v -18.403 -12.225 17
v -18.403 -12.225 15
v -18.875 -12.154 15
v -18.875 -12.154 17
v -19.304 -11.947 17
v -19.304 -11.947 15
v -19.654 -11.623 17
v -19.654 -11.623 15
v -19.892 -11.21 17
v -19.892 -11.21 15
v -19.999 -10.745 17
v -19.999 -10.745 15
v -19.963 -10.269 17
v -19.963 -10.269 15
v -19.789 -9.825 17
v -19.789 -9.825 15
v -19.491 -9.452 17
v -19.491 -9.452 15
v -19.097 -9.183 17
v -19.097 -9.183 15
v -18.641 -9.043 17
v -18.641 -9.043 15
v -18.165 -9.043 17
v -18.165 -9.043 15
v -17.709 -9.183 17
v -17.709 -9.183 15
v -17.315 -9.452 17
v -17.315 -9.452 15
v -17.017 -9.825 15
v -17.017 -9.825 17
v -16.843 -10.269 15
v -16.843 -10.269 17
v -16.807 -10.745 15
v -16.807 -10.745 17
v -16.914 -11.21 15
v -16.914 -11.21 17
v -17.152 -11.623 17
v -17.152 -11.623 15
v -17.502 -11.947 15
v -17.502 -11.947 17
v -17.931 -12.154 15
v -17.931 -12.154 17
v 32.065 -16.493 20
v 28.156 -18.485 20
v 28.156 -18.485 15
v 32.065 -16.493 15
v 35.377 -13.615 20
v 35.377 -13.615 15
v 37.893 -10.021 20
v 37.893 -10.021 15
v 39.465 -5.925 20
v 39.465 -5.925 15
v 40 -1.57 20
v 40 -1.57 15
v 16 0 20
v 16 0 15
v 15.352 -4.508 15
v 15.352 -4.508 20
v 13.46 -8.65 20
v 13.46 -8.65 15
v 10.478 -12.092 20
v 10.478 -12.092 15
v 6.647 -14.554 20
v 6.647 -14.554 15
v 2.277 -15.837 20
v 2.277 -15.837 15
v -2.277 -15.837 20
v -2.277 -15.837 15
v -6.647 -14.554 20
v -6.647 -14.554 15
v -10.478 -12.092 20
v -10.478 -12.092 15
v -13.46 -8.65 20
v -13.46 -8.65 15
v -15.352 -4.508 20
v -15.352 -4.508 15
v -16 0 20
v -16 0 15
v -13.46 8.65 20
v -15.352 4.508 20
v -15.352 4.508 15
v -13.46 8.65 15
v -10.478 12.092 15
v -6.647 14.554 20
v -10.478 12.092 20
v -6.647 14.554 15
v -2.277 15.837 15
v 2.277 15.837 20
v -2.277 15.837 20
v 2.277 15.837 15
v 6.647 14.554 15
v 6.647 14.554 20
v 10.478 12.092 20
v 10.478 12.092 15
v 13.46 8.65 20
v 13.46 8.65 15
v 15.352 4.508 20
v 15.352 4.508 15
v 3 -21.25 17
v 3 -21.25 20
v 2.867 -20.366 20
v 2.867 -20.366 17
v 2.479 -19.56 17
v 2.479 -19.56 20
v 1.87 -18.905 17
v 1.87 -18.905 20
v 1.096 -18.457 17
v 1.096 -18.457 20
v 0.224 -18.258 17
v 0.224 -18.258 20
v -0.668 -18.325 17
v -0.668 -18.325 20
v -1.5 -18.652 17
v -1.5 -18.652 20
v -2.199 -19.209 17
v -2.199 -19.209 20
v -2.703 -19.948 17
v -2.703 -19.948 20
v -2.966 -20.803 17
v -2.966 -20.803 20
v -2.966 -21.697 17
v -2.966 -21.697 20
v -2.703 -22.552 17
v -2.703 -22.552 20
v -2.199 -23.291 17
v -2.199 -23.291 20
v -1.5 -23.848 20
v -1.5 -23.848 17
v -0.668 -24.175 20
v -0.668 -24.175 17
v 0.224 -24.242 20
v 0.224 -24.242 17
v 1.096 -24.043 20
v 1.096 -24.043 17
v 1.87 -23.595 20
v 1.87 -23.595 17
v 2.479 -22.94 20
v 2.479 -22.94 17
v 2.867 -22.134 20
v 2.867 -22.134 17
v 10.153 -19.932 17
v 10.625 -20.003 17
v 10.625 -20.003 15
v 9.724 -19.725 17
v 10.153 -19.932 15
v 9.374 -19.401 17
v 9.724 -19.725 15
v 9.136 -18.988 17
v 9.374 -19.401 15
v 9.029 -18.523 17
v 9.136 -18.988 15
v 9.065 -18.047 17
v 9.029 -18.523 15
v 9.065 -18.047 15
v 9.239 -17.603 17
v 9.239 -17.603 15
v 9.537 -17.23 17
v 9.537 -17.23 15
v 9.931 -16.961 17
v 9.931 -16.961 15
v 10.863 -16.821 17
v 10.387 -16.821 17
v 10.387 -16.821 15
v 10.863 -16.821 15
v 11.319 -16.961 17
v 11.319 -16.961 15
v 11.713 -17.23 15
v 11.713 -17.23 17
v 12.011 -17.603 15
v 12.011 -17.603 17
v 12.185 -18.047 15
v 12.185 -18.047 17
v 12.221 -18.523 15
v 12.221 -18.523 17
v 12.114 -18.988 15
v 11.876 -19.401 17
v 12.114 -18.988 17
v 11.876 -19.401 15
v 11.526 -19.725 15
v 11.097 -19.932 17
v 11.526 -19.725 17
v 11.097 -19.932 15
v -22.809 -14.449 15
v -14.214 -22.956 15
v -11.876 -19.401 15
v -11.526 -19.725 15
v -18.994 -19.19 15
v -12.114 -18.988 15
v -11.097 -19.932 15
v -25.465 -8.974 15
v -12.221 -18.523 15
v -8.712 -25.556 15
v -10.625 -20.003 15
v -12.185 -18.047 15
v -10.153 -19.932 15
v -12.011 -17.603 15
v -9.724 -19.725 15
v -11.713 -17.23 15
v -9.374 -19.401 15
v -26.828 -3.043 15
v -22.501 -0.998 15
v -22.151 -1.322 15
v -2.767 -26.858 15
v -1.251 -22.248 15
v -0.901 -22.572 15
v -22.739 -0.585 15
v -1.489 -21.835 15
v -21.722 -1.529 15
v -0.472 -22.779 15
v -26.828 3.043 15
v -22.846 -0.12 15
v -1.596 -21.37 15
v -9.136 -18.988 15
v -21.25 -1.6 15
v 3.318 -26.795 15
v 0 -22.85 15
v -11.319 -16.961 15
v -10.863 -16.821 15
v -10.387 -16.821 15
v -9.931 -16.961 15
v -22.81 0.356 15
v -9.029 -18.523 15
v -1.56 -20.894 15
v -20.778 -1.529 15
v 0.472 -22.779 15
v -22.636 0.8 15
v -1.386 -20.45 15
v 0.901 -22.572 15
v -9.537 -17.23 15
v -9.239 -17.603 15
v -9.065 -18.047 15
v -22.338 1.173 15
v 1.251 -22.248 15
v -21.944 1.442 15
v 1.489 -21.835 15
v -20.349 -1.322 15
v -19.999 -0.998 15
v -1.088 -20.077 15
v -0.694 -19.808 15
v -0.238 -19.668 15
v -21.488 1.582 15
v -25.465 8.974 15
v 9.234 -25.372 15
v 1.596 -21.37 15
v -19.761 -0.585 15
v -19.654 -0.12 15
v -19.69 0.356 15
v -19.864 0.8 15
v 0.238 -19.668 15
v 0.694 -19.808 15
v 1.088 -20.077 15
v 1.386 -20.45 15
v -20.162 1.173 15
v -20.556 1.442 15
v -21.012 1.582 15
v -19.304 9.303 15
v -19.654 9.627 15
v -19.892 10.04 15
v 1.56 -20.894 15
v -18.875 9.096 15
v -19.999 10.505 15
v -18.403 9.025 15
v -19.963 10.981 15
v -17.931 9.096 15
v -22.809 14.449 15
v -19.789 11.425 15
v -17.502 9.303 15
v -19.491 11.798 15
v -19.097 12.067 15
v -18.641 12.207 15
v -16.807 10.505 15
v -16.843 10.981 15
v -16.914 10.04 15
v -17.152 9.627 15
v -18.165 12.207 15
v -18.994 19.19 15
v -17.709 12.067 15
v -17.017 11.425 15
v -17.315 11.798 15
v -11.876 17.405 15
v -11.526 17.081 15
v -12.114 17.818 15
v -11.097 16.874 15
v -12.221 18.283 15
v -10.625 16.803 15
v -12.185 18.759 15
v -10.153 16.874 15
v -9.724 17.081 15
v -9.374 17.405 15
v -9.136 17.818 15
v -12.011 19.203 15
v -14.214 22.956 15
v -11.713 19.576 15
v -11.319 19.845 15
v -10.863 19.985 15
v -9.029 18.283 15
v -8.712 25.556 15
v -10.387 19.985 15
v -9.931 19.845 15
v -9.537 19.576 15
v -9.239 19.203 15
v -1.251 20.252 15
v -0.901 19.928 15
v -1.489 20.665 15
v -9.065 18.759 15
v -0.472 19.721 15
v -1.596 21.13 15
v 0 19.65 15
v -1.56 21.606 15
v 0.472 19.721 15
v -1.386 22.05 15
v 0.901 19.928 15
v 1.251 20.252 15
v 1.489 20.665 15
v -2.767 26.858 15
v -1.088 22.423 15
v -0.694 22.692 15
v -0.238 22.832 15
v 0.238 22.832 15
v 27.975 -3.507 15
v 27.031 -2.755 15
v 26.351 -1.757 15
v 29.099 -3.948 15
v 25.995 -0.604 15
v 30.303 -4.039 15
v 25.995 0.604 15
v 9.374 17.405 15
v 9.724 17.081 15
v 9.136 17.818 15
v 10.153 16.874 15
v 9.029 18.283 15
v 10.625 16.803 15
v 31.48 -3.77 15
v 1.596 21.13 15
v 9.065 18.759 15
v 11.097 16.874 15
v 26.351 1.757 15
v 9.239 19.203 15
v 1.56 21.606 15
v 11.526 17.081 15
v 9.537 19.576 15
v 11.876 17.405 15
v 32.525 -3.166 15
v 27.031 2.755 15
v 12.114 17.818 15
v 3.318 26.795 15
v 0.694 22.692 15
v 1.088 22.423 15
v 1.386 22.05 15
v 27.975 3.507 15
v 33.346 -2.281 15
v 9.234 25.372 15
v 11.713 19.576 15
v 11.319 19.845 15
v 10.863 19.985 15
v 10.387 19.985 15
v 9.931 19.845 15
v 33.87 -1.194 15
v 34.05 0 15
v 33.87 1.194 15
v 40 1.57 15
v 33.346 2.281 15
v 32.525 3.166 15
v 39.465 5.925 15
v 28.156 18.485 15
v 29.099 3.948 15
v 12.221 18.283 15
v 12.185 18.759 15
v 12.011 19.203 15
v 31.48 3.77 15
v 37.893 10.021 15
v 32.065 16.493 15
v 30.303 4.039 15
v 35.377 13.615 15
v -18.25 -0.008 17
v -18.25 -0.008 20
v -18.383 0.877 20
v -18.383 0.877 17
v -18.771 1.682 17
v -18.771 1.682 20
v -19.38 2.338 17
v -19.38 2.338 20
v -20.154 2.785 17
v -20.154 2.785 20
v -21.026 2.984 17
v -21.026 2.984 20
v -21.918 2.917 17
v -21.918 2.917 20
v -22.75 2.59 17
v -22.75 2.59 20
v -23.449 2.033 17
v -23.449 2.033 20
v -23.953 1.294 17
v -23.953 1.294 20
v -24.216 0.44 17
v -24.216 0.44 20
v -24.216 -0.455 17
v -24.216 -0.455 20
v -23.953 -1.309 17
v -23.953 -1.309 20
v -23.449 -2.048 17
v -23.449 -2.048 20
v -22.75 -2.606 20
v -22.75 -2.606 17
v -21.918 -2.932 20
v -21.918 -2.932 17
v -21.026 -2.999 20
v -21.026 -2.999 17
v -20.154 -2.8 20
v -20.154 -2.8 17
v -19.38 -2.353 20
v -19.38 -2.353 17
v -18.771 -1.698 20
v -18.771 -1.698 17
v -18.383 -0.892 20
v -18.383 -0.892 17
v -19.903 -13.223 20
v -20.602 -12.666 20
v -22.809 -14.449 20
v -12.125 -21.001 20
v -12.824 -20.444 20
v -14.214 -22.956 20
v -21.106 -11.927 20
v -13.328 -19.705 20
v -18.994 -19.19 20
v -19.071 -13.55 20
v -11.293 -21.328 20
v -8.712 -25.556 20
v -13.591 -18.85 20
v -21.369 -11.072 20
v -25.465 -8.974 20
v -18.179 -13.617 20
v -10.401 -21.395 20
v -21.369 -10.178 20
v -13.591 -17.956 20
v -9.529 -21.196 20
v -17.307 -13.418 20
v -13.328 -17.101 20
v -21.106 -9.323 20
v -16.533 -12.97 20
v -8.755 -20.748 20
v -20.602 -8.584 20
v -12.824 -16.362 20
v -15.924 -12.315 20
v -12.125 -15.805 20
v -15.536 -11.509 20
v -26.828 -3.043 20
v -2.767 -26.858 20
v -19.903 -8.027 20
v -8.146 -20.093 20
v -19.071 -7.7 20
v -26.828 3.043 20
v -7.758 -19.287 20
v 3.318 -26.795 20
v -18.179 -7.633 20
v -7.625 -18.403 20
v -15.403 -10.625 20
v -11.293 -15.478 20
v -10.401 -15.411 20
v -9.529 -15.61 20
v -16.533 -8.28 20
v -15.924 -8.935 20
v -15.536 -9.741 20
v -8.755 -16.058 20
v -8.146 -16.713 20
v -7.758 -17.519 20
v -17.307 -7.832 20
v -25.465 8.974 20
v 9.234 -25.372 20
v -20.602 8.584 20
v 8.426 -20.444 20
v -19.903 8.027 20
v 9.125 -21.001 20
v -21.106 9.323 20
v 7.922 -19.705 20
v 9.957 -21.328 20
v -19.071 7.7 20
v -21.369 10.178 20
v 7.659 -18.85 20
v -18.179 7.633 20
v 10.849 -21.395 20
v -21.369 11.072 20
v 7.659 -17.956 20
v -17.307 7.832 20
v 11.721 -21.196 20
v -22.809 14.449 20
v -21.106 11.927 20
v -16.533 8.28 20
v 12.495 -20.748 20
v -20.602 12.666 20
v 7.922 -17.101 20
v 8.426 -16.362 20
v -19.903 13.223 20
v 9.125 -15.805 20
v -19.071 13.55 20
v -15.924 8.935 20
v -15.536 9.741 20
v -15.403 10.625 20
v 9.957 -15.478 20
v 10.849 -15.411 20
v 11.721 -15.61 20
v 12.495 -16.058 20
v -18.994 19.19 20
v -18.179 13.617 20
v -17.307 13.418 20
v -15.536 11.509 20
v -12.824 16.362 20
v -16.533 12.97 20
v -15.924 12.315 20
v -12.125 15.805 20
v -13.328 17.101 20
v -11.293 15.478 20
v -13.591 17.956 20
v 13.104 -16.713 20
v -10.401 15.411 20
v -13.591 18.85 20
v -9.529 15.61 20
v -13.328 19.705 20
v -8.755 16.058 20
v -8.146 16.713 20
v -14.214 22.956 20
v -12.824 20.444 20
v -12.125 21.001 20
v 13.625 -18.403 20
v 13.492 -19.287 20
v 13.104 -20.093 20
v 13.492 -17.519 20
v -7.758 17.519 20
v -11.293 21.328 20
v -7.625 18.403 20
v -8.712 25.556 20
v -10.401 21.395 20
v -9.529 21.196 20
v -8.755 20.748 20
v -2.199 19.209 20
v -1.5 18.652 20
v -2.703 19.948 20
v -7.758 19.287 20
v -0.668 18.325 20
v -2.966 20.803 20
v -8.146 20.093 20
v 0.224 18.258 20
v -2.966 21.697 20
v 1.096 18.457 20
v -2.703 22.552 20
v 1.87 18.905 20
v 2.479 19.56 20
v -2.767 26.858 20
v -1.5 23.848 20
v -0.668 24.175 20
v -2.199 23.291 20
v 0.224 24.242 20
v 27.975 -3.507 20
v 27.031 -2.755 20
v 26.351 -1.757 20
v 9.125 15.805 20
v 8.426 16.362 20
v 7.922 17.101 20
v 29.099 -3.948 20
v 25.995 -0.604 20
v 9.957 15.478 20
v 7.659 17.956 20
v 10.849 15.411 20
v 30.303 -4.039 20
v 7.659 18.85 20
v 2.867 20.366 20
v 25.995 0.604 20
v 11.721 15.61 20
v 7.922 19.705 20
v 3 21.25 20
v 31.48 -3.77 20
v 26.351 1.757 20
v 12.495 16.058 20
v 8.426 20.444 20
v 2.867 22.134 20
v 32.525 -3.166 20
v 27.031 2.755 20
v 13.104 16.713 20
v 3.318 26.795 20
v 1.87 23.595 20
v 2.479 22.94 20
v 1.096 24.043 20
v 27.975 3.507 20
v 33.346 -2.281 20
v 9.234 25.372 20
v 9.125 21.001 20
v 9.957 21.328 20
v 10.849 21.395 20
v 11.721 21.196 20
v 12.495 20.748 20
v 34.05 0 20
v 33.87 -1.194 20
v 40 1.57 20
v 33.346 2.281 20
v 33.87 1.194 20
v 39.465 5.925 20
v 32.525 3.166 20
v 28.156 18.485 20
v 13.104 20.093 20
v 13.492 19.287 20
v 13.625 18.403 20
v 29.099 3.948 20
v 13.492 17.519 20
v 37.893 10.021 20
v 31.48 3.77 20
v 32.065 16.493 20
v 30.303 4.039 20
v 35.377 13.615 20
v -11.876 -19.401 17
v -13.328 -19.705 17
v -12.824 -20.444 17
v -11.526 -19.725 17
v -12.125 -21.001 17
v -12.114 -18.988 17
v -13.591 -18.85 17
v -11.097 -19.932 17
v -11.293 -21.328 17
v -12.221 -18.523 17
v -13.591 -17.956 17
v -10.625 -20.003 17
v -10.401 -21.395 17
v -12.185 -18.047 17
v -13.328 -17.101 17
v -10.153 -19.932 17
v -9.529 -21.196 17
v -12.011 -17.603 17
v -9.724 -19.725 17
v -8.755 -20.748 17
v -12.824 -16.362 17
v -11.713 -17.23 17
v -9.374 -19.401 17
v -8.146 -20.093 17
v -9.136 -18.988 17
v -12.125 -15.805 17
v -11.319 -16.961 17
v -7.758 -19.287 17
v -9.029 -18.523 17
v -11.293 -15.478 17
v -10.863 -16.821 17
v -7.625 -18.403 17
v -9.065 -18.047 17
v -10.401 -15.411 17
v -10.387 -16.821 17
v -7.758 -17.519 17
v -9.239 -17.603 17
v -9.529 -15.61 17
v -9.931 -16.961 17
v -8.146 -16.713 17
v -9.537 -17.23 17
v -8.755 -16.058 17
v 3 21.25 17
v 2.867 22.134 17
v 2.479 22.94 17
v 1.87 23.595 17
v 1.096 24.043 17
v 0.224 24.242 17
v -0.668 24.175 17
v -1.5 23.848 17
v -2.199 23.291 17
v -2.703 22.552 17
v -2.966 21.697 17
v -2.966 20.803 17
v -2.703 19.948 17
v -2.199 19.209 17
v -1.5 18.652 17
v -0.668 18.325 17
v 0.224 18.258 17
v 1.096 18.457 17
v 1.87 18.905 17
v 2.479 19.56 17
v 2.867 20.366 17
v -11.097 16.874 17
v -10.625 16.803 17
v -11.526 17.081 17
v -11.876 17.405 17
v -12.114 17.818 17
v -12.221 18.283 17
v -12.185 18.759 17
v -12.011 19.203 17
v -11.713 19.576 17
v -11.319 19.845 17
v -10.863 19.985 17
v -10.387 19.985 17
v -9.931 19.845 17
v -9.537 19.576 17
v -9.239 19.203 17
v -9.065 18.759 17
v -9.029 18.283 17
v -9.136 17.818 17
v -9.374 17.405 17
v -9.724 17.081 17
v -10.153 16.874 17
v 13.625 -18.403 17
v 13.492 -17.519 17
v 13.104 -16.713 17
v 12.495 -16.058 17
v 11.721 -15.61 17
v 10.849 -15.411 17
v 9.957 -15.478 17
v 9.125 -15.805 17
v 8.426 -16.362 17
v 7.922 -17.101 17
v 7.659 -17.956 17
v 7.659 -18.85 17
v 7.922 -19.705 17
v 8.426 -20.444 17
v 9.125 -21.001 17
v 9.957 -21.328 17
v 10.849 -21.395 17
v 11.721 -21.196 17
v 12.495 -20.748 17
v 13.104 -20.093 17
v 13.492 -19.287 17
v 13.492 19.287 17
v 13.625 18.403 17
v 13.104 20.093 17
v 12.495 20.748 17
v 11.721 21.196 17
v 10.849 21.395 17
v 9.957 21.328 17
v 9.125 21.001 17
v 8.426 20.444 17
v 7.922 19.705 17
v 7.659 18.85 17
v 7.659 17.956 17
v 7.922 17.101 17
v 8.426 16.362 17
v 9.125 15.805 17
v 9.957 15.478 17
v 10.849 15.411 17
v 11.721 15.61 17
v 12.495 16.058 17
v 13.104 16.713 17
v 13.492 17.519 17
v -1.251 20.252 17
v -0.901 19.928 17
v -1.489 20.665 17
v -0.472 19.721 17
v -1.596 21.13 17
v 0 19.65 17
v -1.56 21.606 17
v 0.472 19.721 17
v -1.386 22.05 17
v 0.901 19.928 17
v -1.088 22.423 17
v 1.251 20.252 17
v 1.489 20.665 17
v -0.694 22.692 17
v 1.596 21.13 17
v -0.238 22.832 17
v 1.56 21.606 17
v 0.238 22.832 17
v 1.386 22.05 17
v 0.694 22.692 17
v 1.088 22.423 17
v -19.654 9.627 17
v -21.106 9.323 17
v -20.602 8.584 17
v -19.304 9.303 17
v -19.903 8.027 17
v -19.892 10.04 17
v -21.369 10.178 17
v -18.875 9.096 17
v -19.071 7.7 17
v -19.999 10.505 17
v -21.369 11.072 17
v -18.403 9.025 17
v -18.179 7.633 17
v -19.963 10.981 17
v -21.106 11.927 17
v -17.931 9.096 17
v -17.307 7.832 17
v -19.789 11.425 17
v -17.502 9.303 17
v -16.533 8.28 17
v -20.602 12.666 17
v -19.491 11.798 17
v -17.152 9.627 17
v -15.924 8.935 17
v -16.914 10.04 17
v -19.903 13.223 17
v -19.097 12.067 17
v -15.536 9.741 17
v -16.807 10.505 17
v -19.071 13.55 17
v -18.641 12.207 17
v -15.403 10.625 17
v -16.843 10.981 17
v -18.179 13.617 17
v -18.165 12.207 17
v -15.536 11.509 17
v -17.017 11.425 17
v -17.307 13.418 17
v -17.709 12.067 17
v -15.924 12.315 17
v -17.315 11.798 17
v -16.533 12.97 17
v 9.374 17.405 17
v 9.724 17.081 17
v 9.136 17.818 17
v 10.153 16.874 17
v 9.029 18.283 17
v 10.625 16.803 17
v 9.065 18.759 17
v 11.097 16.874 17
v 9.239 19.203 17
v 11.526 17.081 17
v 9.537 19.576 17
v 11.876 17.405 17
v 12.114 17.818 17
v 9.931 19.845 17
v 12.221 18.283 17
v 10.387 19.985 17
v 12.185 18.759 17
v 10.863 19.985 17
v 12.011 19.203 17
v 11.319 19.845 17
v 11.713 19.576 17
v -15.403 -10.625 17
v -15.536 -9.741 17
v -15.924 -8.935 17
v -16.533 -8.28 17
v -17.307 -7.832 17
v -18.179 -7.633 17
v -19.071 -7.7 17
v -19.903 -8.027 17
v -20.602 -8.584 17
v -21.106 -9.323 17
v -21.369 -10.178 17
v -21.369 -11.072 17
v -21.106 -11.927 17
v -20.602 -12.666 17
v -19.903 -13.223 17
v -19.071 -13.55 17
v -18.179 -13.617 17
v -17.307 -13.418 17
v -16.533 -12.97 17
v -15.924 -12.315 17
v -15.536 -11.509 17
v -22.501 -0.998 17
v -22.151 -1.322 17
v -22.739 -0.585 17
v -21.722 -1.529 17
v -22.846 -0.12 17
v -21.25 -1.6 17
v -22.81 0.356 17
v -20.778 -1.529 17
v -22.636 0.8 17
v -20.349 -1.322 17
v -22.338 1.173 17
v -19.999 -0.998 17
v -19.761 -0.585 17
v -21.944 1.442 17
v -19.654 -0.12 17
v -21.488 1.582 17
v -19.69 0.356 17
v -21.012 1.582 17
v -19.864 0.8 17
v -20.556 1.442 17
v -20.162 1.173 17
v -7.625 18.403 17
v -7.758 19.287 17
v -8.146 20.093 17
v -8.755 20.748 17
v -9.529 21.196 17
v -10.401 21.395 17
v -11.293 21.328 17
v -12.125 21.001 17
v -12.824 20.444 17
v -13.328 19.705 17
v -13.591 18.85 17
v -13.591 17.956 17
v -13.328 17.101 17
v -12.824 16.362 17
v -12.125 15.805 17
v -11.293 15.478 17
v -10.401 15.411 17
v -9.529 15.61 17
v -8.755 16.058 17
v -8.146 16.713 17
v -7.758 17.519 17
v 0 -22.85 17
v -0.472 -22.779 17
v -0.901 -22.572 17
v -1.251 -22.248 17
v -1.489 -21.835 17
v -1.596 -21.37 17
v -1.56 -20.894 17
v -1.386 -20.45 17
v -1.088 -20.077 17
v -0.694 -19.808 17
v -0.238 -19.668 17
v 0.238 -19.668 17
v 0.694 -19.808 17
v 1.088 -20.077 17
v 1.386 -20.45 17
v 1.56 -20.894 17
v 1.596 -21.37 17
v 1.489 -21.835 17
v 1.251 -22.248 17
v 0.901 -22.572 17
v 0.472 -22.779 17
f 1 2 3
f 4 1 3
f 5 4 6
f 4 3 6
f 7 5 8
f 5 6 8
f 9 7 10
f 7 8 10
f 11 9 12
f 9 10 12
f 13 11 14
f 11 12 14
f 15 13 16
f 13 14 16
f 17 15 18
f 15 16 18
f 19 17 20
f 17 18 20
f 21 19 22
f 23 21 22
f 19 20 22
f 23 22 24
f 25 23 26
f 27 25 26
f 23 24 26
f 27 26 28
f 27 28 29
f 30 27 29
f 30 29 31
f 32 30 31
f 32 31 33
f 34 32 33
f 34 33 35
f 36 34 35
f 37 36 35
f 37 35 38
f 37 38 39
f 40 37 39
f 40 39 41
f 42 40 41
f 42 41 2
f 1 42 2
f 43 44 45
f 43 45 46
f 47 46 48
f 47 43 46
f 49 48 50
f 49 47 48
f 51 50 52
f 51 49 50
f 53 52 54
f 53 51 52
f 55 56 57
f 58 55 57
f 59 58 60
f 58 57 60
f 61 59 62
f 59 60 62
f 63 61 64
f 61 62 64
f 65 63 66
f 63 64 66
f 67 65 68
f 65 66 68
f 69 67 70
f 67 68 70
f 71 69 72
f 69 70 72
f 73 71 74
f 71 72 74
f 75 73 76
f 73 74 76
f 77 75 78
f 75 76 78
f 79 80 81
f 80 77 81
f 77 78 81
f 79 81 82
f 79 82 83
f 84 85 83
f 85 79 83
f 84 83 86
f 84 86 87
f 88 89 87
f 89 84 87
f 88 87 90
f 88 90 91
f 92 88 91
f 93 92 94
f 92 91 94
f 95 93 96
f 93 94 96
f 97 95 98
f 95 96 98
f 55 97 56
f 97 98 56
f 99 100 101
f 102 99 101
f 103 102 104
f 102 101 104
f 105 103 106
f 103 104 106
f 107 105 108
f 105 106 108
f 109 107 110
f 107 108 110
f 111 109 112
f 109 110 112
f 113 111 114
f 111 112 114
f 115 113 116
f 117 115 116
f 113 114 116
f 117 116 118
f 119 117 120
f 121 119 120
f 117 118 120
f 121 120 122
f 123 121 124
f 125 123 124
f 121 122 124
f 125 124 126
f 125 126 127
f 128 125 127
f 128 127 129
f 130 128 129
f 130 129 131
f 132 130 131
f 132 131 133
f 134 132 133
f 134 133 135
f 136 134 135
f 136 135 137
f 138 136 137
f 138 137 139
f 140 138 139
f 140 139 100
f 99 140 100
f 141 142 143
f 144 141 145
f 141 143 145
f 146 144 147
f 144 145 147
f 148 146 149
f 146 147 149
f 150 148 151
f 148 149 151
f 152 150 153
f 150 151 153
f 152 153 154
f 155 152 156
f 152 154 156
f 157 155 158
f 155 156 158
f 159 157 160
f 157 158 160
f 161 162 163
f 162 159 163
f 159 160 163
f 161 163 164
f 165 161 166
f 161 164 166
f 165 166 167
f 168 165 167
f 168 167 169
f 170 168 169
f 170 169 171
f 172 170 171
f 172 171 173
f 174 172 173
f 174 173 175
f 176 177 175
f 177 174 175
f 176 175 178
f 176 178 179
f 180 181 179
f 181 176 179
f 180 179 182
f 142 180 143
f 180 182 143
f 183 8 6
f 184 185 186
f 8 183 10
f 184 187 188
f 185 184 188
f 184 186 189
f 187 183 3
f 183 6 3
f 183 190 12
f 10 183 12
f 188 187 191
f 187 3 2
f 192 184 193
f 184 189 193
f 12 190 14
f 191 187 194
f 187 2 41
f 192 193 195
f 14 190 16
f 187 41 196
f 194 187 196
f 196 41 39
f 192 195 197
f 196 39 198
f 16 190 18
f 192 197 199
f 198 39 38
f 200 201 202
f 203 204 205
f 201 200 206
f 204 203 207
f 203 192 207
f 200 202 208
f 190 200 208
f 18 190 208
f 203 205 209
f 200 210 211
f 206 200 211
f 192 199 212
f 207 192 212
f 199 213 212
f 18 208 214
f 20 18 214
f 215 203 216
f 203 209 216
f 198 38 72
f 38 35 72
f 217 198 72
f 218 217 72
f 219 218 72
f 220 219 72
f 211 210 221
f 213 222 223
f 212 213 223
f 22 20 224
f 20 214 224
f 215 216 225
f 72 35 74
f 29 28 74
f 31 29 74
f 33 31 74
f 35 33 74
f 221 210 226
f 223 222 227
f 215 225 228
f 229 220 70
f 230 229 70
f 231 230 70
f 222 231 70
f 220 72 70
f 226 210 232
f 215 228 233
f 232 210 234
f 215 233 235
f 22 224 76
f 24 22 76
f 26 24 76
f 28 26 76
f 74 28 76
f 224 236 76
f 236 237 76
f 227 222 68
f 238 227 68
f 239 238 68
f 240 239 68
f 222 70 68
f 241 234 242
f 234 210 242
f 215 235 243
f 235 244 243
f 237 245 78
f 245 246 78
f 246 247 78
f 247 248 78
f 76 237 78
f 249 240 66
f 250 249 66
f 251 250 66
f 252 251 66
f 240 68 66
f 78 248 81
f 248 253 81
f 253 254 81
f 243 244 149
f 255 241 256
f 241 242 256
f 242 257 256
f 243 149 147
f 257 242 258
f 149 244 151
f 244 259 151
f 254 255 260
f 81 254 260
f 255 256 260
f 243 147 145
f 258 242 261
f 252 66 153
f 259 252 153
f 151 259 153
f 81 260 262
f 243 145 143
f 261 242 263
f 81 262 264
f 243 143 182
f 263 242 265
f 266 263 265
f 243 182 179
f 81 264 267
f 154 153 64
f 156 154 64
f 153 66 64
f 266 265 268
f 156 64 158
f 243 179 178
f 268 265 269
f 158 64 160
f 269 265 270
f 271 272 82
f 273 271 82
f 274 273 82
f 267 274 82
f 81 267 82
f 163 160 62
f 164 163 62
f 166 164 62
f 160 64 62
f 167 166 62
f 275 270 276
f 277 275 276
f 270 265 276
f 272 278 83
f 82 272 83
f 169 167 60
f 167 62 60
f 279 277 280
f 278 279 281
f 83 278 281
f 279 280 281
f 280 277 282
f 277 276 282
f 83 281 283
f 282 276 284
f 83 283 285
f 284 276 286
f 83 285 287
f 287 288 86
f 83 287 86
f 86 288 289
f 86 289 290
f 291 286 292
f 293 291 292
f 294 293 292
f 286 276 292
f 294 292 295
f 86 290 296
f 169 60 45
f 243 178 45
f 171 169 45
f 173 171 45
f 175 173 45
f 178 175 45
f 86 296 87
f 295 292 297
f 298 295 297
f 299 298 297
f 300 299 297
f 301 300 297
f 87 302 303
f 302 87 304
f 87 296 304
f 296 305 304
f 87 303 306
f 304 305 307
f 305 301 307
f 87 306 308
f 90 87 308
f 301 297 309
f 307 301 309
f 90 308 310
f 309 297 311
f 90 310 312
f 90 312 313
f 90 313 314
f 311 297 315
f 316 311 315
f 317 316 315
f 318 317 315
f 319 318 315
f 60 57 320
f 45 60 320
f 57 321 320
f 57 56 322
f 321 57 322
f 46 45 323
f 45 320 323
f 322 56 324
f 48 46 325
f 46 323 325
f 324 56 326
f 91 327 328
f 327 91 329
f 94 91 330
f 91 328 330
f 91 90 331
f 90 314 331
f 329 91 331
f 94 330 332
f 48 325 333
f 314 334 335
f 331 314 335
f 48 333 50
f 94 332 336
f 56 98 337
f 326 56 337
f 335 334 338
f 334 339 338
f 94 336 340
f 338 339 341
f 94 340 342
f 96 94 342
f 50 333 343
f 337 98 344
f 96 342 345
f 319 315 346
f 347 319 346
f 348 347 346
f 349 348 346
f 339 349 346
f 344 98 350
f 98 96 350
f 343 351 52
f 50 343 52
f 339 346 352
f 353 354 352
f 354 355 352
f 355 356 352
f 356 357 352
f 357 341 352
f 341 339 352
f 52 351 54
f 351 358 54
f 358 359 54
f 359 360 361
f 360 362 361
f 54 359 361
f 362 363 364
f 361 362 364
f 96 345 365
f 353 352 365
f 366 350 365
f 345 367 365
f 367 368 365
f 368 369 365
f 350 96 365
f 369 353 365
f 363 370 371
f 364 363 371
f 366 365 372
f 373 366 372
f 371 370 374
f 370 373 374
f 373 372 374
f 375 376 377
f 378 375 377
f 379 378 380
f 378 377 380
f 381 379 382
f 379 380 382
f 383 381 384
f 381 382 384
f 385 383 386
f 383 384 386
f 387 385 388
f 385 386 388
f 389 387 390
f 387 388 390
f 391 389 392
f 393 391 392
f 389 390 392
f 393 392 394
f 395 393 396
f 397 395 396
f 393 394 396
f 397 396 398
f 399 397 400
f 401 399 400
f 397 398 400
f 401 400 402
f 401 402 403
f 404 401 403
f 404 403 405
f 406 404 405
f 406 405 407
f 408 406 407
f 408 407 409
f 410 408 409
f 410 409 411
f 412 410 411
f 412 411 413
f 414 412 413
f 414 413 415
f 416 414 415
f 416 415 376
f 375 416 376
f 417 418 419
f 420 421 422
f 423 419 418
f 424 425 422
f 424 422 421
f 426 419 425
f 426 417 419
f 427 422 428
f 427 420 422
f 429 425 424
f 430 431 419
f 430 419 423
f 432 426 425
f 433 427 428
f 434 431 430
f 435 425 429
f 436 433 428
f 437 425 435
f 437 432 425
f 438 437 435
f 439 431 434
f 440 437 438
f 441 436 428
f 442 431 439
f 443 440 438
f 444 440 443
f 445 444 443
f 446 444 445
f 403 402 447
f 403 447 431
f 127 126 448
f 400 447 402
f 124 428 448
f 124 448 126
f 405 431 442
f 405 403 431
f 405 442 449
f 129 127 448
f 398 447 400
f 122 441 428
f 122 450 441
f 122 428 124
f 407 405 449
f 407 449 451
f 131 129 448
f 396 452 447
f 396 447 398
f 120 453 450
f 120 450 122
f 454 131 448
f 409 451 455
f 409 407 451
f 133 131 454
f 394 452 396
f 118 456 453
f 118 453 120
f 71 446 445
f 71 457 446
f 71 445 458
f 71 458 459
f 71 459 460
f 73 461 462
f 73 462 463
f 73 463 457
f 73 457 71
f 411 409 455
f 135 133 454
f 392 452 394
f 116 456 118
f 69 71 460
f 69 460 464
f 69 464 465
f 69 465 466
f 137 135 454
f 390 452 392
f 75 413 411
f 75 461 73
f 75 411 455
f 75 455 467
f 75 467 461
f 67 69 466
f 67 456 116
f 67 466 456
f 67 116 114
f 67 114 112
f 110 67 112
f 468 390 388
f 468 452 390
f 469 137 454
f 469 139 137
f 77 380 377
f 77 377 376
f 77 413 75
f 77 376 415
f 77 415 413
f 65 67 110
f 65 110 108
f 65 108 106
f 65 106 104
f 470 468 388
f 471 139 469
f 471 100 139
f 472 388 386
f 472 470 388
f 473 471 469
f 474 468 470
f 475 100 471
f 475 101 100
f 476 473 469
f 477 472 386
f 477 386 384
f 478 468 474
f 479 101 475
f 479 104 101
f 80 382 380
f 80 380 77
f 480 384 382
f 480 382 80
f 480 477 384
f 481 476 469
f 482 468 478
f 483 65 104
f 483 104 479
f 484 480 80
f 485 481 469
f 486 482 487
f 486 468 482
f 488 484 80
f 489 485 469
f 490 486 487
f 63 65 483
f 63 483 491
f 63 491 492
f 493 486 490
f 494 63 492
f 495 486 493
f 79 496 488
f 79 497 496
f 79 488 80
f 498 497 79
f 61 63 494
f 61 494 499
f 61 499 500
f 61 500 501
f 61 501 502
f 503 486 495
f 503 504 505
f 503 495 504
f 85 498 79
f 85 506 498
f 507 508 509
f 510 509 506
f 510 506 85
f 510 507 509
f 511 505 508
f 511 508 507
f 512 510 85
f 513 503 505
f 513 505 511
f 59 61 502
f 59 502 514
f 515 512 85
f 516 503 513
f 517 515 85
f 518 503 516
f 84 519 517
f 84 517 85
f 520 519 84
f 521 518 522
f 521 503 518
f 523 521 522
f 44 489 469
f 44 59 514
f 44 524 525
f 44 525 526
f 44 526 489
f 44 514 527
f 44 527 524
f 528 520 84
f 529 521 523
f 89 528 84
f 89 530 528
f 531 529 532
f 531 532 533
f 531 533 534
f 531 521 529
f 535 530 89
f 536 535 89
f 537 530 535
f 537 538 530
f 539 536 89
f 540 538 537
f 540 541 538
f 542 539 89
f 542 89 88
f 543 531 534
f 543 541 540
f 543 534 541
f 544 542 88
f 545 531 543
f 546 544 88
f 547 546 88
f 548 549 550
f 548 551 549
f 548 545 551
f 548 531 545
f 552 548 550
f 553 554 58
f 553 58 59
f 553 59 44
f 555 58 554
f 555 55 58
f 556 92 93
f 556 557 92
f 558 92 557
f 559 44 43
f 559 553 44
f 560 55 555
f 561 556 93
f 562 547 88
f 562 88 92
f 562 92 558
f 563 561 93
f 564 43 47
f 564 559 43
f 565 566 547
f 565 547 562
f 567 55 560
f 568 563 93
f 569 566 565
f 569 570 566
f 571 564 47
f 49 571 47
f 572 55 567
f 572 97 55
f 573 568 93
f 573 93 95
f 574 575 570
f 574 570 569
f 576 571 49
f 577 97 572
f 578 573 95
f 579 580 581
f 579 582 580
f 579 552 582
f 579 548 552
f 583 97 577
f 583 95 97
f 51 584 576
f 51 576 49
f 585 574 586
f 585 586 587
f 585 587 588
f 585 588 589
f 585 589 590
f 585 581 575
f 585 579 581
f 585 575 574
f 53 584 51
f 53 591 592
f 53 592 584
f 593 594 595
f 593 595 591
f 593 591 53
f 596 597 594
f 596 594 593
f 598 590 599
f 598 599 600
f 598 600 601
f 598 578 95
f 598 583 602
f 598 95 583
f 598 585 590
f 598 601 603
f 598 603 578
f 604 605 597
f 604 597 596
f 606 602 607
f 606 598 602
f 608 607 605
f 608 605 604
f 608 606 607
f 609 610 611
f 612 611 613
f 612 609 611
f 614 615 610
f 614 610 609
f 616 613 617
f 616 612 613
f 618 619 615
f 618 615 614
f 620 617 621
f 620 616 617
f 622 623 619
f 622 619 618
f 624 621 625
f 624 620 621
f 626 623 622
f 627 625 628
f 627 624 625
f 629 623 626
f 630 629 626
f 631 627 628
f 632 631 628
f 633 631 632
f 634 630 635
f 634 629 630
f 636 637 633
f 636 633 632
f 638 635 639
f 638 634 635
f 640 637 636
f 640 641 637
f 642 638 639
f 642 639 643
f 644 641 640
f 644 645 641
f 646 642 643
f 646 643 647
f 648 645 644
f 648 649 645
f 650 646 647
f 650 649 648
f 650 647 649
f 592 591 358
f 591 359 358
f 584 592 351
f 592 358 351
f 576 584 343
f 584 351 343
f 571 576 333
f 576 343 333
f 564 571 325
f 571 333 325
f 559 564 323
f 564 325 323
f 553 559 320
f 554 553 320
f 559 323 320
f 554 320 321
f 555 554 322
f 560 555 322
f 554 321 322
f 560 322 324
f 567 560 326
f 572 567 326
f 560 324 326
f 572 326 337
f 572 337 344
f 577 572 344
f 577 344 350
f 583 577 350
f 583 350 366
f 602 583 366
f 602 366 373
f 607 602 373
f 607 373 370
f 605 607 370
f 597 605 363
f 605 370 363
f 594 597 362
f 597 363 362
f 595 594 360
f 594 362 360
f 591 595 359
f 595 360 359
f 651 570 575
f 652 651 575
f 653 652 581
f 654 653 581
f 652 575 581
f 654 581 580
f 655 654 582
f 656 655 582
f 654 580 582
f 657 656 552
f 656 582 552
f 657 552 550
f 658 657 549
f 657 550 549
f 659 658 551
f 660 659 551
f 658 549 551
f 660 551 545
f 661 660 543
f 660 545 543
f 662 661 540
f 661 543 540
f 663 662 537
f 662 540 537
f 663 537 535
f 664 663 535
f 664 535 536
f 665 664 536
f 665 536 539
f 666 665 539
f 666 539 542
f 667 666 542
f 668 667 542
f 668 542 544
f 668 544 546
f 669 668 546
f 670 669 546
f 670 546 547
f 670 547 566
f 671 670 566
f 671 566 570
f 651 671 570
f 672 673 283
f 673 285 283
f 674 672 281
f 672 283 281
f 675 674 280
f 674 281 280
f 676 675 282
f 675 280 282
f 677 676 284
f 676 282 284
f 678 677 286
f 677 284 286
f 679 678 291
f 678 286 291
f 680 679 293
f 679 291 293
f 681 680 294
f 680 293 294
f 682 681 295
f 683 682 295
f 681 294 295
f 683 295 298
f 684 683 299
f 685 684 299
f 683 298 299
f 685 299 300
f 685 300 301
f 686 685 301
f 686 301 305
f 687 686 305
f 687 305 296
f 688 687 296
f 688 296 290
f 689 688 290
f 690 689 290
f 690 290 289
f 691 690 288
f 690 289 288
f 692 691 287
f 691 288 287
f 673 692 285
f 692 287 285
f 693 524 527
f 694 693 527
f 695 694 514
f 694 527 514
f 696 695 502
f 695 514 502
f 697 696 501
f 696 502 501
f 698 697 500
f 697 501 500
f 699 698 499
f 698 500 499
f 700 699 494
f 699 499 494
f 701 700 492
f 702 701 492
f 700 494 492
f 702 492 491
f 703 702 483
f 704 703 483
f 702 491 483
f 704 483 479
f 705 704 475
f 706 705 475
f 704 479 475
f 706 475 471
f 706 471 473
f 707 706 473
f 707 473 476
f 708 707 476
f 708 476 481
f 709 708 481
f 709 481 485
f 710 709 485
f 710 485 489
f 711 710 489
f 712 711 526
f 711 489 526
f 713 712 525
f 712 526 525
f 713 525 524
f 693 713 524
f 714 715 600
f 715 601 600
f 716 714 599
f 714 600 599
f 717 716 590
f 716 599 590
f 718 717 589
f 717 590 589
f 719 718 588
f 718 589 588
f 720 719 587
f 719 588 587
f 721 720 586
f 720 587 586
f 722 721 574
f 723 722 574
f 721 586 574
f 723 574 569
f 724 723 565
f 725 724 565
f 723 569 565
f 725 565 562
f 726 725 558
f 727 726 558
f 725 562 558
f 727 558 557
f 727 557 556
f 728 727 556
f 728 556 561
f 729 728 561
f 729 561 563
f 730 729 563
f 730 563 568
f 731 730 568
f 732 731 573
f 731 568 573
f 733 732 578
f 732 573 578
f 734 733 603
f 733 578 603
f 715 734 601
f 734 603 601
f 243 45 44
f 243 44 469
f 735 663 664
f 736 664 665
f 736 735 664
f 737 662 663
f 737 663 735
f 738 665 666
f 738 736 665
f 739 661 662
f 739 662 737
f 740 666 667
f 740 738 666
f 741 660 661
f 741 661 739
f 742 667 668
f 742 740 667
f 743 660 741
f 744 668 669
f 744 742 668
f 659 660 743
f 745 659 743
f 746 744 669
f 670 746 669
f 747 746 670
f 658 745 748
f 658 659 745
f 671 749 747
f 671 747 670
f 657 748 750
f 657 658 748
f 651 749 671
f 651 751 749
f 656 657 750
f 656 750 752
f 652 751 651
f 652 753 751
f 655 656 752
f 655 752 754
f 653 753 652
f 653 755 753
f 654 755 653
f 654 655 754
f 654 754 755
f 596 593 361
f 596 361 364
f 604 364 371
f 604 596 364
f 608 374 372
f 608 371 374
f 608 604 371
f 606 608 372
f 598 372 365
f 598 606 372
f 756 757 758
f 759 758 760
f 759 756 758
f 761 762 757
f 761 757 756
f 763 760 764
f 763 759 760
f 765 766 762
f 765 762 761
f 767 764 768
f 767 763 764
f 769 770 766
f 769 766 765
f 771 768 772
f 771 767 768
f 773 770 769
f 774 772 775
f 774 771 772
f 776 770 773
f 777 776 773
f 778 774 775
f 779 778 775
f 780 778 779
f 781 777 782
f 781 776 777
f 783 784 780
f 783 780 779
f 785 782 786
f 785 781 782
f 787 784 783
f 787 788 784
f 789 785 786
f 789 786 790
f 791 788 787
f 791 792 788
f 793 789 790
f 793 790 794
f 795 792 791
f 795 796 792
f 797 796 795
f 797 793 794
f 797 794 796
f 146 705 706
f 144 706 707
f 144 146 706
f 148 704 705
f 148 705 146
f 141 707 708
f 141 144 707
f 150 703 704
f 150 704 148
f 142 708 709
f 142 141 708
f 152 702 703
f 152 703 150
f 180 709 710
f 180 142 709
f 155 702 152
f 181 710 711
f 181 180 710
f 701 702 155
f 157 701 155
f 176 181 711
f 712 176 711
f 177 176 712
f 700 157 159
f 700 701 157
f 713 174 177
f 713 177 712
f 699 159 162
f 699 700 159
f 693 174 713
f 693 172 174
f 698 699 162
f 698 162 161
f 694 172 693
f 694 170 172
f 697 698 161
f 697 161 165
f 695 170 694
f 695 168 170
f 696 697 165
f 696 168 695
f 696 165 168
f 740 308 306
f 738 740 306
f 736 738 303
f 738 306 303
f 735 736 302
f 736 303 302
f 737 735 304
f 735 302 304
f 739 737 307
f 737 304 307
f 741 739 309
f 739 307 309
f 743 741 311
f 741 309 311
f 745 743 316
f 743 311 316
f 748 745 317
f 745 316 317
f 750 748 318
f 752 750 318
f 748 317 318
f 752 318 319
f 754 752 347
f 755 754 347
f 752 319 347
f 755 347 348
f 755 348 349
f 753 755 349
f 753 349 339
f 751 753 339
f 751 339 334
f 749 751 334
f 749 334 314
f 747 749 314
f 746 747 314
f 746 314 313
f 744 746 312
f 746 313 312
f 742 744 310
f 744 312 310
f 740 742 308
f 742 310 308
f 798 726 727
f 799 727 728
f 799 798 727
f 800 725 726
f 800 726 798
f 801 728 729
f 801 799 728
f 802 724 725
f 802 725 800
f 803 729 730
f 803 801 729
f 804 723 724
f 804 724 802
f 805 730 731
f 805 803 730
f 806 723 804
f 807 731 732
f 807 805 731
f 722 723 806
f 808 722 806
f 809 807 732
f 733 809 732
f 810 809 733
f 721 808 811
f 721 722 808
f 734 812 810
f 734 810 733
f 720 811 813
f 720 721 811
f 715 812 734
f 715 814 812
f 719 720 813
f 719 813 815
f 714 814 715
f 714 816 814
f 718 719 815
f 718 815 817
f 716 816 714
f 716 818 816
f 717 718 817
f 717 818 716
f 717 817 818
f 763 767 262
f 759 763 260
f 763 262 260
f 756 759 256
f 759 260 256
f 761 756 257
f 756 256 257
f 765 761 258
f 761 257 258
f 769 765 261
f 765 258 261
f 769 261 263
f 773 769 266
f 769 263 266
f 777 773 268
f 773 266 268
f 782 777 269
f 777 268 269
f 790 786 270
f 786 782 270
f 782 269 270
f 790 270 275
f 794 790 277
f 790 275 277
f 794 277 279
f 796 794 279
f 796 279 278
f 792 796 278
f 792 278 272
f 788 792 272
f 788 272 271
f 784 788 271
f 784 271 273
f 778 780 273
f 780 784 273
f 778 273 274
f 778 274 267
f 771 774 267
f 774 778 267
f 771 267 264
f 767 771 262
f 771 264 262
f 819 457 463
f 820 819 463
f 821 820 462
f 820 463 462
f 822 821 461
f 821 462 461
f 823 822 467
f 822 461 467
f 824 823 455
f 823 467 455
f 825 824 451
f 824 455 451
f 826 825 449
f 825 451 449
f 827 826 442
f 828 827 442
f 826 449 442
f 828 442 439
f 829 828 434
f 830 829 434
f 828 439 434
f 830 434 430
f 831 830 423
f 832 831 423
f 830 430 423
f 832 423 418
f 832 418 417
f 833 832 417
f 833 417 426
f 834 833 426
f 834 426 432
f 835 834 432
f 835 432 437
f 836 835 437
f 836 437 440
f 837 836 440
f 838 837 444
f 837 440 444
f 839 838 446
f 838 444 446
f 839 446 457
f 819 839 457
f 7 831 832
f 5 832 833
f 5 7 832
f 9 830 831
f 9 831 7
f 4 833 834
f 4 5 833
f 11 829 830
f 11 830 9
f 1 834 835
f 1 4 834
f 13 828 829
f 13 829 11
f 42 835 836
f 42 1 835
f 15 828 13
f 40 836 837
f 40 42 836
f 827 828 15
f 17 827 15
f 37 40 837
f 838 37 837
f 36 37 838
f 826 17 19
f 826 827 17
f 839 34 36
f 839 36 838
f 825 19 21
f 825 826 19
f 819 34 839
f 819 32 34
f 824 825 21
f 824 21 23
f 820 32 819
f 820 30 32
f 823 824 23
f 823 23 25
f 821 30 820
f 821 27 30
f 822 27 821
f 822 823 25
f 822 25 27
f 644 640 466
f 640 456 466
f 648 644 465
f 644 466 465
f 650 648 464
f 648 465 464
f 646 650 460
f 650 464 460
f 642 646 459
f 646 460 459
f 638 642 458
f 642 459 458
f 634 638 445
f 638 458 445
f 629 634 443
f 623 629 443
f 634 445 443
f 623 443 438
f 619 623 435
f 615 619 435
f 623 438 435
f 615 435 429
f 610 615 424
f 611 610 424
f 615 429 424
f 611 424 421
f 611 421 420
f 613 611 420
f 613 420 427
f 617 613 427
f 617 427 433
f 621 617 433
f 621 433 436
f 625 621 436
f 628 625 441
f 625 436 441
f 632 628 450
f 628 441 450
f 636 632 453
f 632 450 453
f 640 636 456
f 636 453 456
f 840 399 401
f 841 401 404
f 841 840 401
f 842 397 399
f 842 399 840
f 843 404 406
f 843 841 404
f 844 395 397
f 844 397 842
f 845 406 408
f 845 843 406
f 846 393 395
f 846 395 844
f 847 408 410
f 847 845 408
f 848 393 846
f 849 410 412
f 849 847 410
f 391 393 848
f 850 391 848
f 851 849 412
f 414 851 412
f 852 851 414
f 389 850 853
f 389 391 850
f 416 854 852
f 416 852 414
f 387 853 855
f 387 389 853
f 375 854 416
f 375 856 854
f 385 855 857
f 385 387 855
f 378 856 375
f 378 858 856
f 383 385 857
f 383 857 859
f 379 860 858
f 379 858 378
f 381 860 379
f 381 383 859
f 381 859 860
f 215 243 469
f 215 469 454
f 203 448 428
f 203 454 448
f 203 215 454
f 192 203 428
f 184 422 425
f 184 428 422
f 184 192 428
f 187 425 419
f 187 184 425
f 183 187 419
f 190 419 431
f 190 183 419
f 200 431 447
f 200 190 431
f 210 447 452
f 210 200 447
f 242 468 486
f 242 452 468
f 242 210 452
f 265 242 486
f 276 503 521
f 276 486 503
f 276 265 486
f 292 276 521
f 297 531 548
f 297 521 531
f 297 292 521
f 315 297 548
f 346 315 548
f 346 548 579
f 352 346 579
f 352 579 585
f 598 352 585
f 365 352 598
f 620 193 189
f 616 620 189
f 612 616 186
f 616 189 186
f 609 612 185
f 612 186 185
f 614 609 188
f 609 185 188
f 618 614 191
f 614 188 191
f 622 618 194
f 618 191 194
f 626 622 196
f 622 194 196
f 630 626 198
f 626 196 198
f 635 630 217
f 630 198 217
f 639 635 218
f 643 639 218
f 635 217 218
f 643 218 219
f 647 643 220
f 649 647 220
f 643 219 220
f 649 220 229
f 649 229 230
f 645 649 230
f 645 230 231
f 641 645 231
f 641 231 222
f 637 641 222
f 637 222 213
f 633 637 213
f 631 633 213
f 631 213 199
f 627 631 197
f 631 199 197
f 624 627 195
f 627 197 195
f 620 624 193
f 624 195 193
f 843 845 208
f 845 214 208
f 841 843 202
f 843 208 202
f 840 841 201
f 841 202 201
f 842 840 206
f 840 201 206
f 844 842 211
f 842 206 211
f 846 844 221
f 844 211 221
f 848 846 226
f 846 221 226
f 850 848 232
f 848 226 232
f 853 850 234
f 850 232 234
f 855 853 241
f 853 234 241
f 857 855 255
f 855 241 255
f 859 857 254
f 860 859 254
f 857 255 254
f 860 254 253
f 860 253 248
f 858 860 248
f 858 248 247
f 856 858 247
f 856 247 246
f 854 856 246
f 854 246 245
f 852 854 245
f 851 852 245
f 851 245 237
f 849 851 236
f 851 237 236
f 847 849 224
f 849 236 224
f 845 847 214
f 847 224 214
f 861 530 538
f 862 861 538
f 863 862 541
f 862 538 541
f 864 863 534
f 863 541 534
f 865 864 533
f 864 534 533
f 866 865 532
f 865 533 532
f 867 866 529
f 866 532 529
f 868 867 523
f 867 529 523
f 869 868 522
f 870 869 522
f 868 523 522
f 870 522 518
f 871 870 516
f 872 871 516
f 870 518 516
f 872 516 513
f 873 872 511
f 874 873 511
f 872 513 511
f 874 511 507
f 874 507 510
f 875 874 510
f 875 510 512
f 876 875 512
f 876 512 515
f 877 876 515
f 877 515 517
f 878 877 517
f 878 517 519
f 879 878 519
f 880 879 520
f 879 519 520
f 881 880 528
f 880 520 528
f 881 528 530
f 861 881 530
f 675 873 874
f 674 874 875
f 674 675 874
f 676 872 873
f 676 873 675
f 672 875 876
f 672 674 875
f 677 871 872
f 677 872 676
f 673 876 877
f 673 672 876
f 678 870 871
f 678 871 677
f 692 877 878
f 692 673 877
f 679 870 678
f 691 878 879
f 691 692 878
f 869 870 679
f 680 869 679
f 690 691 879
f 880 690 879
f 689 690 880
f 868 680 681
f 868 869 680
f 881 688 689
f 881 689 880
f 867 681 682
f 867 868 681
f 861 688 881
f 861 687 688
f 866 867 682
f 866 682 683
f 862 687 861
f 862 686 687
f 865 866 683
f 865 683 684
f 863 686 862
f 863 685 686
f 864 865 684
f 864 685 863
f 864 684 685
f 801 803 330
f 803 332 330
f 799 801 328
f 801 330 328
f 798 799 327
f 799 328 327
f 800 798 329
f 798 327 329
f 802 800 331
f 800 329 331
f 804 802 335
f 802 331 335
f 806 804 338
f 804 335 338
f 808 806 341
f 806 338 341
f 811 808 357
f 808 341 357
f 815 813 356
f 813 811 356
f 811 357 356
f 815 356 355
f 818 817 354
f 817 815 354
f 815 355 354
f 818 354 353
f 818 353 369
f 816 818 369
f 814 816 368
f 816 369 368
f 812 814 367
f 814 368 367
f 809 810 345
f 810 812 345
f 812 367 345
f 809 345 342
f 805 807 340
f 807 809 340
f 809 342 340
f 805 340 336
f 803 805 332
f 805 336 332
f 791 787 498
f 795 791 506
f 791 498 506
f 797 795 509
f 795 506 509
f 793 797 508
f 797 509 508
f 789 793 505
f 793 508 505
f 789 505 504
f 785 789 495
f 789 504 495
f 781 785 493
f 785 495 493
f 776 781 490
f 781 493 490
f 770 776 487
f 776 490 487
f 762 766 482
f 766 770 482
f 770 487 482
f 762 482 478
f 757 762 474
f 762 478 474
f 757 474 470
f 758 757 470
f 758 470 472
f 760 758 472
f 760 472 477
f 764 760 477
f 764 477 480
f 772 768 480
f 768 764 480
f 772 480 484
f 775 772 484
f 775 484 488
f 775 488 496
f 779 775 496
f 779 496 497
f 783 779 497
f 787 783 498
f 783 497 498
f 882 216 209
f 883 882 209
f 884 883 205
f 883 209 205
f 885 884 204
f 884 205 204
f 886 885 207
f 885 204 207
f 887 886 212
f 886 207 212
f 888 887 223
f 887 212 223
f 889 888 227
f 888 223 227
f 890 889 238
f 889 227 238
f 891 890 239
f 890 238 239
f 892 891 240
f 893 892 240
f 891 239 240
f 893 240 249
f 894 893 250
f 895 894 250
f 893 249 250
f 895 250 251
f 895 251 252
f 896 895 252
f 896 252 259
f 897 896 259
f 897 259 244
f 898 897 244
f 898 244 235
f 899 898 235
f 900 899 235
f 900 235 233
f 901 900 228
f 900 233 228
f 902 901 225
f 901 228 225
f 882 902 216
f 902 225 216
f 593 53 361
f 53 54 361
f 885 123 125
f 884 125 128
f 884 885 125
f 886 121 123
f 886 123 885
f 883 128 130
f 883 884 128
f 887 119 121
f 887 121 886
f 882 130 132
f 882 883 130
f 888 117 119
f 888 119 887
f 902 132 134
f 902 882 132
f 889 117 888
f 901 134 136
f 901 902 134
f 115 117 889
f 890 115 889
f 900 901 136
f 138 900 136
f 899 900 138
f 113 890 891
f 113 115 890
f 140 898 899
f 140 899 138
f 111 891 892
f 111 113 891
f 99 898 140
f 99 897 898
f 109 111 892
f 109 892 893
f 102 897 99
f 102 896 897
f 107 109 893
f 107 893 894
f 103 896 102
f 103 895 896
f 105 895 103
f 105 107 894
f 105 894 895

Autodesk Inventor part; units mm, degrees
ref_plane "YZ Plane" through (0, 0, 0) normal (1, 0, 0) x (0, 1, 0)
ref_plane "XZ Plane" through (0, 0, 0) normal (0, 1, 0) x (-1, 0, 0)
ref_plane "作業平面1" through (0, 0, 14) normal (0, 0, 1) x (-0.9659, -0.2588, 0)
sketch "スケッチ14" plane through (0, 0, 0) normal (0, 0, 1) x (1, 0, 0)
  circle A0 centre (0, 0) radius 25
  circle A1 centre (30, 0) radius 4.05
  line L0 (0, 25) -> (40, 25)
  line L1 (40, 25) -> (40, -25)
  line L2 (40, -25) -> (0, -25)
  line L3 (0, -25) -> (0, 25)
  line L4 (0, -25) -> (40, -10.4412)
  line L5 (0, 25) -> (40, 10.4412)
  line L6 (0.5157, 26.4168) -> (40.5157, 11.858)
  line L7 (0.5157, -26.4168) -> (40.5157, -11.858)
  circle A2 centre (0, 0) radius 6.5
  circle A3 centre (0, 0) radius 28
  line L8 (1.5417, 29.2358) -> (41.5417, 14.677)
  line L9 (1.5417, -29.2358) -> (41.5417, -14.677)
  point P0 (8.5505, -23.4923)
  point P1 (40, -12.0456)
  point P2 (40, 12.0456)
  point P3 (8.5505, 23.4923)
  point P4 (40, 15.2382)
  point P5 (9.5766, 26.3114)
  point P6 (9.5766, -26.3114)
  point P7 (40, -15.2382)
  dimension "d111" = 50
  dimension "d112" = 8.1
  dimension "d113" = 30
  dimension "d114" = 40
  dimension "d115" = 50
  dimension "d116" = 25
  dimension "d119" = 25
  dimension "d126" = 20
  dimension "d127" = 20
  dimension "d144" = 13
  dimension "d207" = 3
  dimension "d208" = 3
  dimension "d209" = 3
extrude "押し出し9" add sketch "スケッチ14" along normal blind 5 contours L3 A2 A0 | L0 L6 A0 | A0 L2 A3 L0 | L5 A0 L4 L3 A2 | A0 L5 | L4 A0 | A0 L7 L2 | L6 A3 L5 A0 | L6 L0 A3 | L5 A3 A1 L4 A0 | L7 A3 L2 | A0 L4 A3 L7 | A3 L0 L8 L1 L6 | L6 L1 L5 A3 | A3 L8 L0 | L5 L1 L4 A3 A1 | A3 L4 L1 L7 | L7 L1 L9 L2 A3 | L2 L9 A3
sketch "スケッチ15" plane through (0, 0, 0) normal (0, 0, -1) x (-1, 0, 0)
  circle A0 centre (-30, 0) radius 4.05 projected
  circle A1 centre (-30, 0) radius 6.6
  point P0 (0, 0)
  dimension "d122" = 13.2
extrude "押し出し10" cut sketch "スケッチ15" against normal blind 2
sketch "スケッチ16" plane through (0, 0, 5) normal (0, 0, 1) x (1, 0, 0)
  circle A0 centre (30, 0) radius 4.05 projected
  circle A1 centre (30, 0) radius 17
  arc A2 (8.5505, 23.4923) -> (8.5505, -23.4923) centre (0, 0) ccw projected
  circle A3 centre (0, 0) radius 25
  line L0 (40, -15.2382) -> (40, 15.2382) projected
  line L1 (40, 12.0456) -> (-0.2187, 26.6841)
  line L2 (40, -12.0456) -> (-2.6962, -27.5858)
  circle A4 centre (0, 0) radius 17.5
  line L3 (8.5505, 23.4923) -> (5.9854, 16.4446)
  line L4 (-17.5, 0) -> (-25, 0)
  line L5 (-2.7839, 19.6364) -> (32.5, 6.7941)
  line L6 (32.5, 6.7941) -> (32.5, -6.7941)
  line L7 (32.5, -6.7941) -> (-5.2613, -20.5381)
  line L8 (17.9474, 20.0721) -> (15.3823, 13.0244)
  point P0 (0, 25)
  point P1 (0, -25)
  dimension "d125" = 34
  dimension "d128" = 7.5
  dimension "d164" = 7.5
  dimension "d165" = 10
extrude "押し出し11" add sketch "スケッチ16" along normal blind 10 contours L8 L5 L3 A3 | A3 L1 L8 | L3 A4 L4 A2
sketch "スケッチ17" plane through (0, 0, 5) normal (0, 0, 1) x (1, 0, 0)
  circle A0 centre (30, 0) radius 4.05 projected
  line L0 (0, 0) -> (30, 0)
  circle A1 centre (0, 0) radius 12.5
  line L1 (0, 0) -> (12.4415, 7.1831)
  point P0 (10.8253, 6.25)
  point P1 (0, 12.5)
  point P2 (-10.8253, 6.25)
  point P3 (-10.8253, -6.25)
  point P4 (0, -12.5)
  point P5 (10.8253, -6.25)
  dimension "d131" = 25
  dimension "d132" = 30
  dimension "d135" = 360
hole "穴5" at (10.8253, 6.25, 5) at (0, 12.5, 5) at (-10.8253, 6.25, 5) at (-10.8253, -6.25, 5) at (0, -12.5, 5) at (10.8253, -6.25, 5) direction (0, 0, -1) diameter 3.2 end through all
sketch "スケッチ18" plane through (0, 0, 5) normal (0, 0, 1) x (1, 0, 0)
  circle A0 centre (30, 0) radius 4.05 projected
  line L0 (0, 0) -> (30, 0)
  circle A1 centre (0, 0) radius 10.2
  point P0 (10.2, 0)
  point P1 (-5.1, 8.8335)
  point P2 (-5.1, -8.8335)
  dimension "d145" = 20.4
  dimension "d148" = 360
hole "穴6" at (10.2, 0, 5) at (-5.1, 8.8335, 5) at (-5.1, -8.8335, 5) direction (0, 0, -1) diameter 4.2 end through all
sketch "スケッチ19" plane through (0, 0, 5) normal (0, 0, 1) x (1, 0, 0)
  circle A0 centre (0, 12.5) radius 1.6 projected
  circle A1 centre (0, 0) radius 12.5
  circle A2 centre (0, 12.5) radius 3
  circle A3 centre (-10.8253, 6.25) radius 3
  circle A4 centre (-10.8253, -6.25) radius 3
  circle A5 centre (0, -12.5) radius 3
  circle A6 centre (10.8253, -6.25) radius 3
  circle A7 centre (10.8253, 6.25) radius 3
  dimension "d157" = 6
  dimension "d160" = 360
extrude "押し出し12" cut sketch "スケッチ19" against normal blind 3 contours A0 A1 | A0 A1 A2 | A1 A0 | A0 A1 A2 | A3 A1 | A1 A3 | A7 A1 | A1 A7 | A4 A1 | A1 A4 | A6 A1 | A1 A6 | A5 A1 | A1 A5
sketch "スケッチ20" plane through (0, 0, 15) normal (0, 0, 1) x (1, 0, 0)
  line L0 (17.9474, 20.0721) -> (8.5505, 23.4923) projected
  line L1 (17.9474, 20.0721) -> (15.3823, 13.0244)
  line L2 (15.3823, 13.0244) -> (5.9854, 16.4446)
  line L3 (5.9854, 16.4446) -> (8.5505, 23.4923)
  line L4 (0, 0) -> (0, 30.7788)
  circle A0 centre (0, 0) radius 21.25
  circle A1 centre (0, 0) radius 25
  point P0 (11.9664, 18.2584)
  point P1 (0, 21.25)
  point P2 (-10.625, 18.403)
  point P3 (-18.403, 10.625)
  point P4 (-21.25, 0)
  point P5 (-18.403, -10.625)
  point P6 (-10.625, -18.403)
  point P7 (0, -21.25)
  point P8 (10.625, -18.403)
  point P9 (18.403, -10.625)
  point P10 (21.25, 0)
  point P11 (18.403, 10.625)
  point P12 (10.625, 18.403)
  dimension "d167" = 7.5
  dimension "d168" = 5
  dimension "d169" = 3.75
  dimension "d170" = 3.75
  dimension "d171" = 50
  dimension "d174" = 360
hole "穴7" at (11.9664, 18.2584, 15) at (0, 21.25, 15) at (-10.625, 18.403, 15) at (-18.403, 10.625, 15) direction (0, 0, -1) diameter 2.459 end through all thread size "M3x0.5" class "6H" standard "ISO Metric profile"
sketch "スケッチ21" plane through (0, 0, 15) normal (0, 0, 1) x (1, 0, 0)
  circle A0 centre (0, 0) radius 25
  line L0 (40, -15.2382) -> (40, 15.2382) projected
  line L1 (40, 12.0456) -> (40, -12.0456)
  line L2 (8.5505, -23.4923) -> (40, -12.0456) projected
  line L3 (40, -12.0456) -> (8.5505, -23.4923)
  line L4 (40, 12.0456) -> (8.5505, 23.4923)
  line L5 (40, 0) -> (-25, 0)
  circle A1 centre (0, 0) radius 16
  circle A2 centre (30, 0) radius 4.05 projected
  circle A3 centre (30, 0) radius 4.05
  line L6 (9.2345, 25.3717) -> (42, 13.4461)
  line L7 (42, 13.4461) -> (42, -13.4461)
  line L8 (42, -13.4461) -> (9.2345, -25.3717)
  circle A4 centre (0, 0) radius 27
  line L9 (40, 15.2382) -> (40, -15.2382)
  point P0 (40, 14.174)
  point P1 (9.2345, 25.3717)
  point P2 (9.2345, -25.3717)
  point P3 (40, -14.174)
  dimension "d183" = 32
  dimension "d184" = 8.1
  dimension "d210" = 2
  dimension "d211" = 2
extrude "押し出し13" add sketch "スケッチ21" along normal blind 5 contours L5 A1 A0 | L5 A2 A4 L2 A0 | A0 L5 A1 | A0 L4 A4 A2 L5 | A0 L2 A4 L4 | A4 L6 L0 L4 | L4 L0 L5 A2 A4 | A4 A2 L5 L0 L2 | L2 L0 L8 A4
sketch "スケッチ22" plane through (0, 0, 20) normal (0, 0, 1) x (1, 0, 0)
  circle A0 centre (0, 21.25) radius 1.2295 projected
  circle A1 centre (0, 0) radius 21.25
  circle A2 centre (-10.625, 18.403) radius 1.2295 projected
  circle A3 centre (-18.403, 10.625) radius 1.2295 projected
  circle A4 centre (11.9664, 18.2584) radius 1.2295 projected
  line L0 (-17.5, 0) -> (-25, 0) projected
  line L1 (-25, 0) -> (40, 0)
  line L2 (40, -15.2382) -> (40, 15.2382) projected
  point P0 (40, -12.0456)
  point P1 (40, 12.0456)
  point P2 (0, -21.25)
  point P3 (-10.625, -18.403)
  point P4 (-18.403, -10.625)
  point P5 (11.9664, -18.2584)
  point P6 (-21.25, 0)
  point P7 (-18.403, 10.625)
  point P8 (-21.25, 0)
  point P9 (-18.403, -10.625)
  point P10 (-10.625, -18.403)
  point P11 (0, -21.25)
  point P12 (10.625, -18.403)
  point P13 (18.403, -10.625)
  point P14 (21.25, 0)
  point P15 (18.403, 10.625)
  point P16 (10.625, 18.403)
  point P17 (0, 21.25)
  dimension "d215" = 360
hole "穴8" at (10.625, -18.403, 20) at (0, -21.25, 20) at (-10.625, -18.403, 20) at (-18.403, -10.625, 20) at (-18.403, 10.625, 20) at (-21.25, 0, 20) at (-10.625, 18.403, 20) at (0, 21.25, 20) at (10.625, 18.403, 20) direction (0, 0, -1) diameter 3.2 end through all
sketch "スケッチ23" plane through (0, 0, 0) normal (0, 0, -1) x (-1, 0, 0)
  line L0 (46.3543, -34.5724) -> (-56.544, -34.5724)
  line L1 (-56.544, -34.5724) -> (-56.544, 32.2069)
  line L2 (-56.544, 32.2069) -> (46.3543, 32.2069)
  line L3 (46.3543, 32.2069) -> (46.3543, -34.5724)
  point P0 (0, 0)
extrude "押し出し14" cut sketch "スケッチ23" against normal blind 15
sketch "スケッチ24" plane through (0, 0, 20) normal (0, 0, 1) x (1, 0, 0)
  circle A0 centre (0, 21.25) radius 1.6 projected
  circle A1 centre (0, 21.25) radius 3
  circle A2 centre (-10.625, 18.403) radius 1.6 projected
  circle A3 centre (-10.625, 18.403) radius 3
  circle A4 centre (-18.403, 10.625) radius 1.6 projected
  circle A5 centre (-18.403, 10.625) radius 3
  line L0 (0, 0) -> (-8.2063, 0)
  circle A6 centre (0, -21.25) radius 3
  circle A7 centre (-10.625, -18.403) radius 3
  circle A8 centre (-18.403, -10.625) radius 3
  circle A9 centre (-21.25, -0.0076) radius 3
  circle A10 centre (0, 0) radius 21.25
  circle A11 centre (10.625, 18.403) radius 1.6 projected
  circle A12 centre (10.625, 18.403) radius 3
  circle A13 centre (10.625, -18.403) radius 1.6 projected
  circle A14 centre (10.625, -18.403) radius 3
  dimension "d198" = 6
  dimension "d199" = 6
  dimension "d200" = 6
  dimension "d203" = 6
  dimension "d217" = 6
  dimension "d218" = 6
extrude "押し出し15" cut sketch "スケッチ24" against normal blind 3 contours A0 A10 | A0 A10 A1 | A10 A0 | A0 A10 A1 | A10 A2 A3 | A3 A10 A2 | A12 A10 A11 | A10 A11 A12 | A10 A2 | A2 A10 | A10 A4 A5 | A5 A10 A4 | A14 A10 A13 | A10 A13 A14 | A10 A9 | A9 A10 | A10 A6 | A6 A10 | A10 A8 | A8 A10 | A10 A7 | A7 A10
fillet "フィレット10" radius 18 2 edges at (40, 14.174, 17.5) (40, -14.174, 17.5)
properties part number "RP_Thigh-Base-Cover" material "アルミニウム 6061"
